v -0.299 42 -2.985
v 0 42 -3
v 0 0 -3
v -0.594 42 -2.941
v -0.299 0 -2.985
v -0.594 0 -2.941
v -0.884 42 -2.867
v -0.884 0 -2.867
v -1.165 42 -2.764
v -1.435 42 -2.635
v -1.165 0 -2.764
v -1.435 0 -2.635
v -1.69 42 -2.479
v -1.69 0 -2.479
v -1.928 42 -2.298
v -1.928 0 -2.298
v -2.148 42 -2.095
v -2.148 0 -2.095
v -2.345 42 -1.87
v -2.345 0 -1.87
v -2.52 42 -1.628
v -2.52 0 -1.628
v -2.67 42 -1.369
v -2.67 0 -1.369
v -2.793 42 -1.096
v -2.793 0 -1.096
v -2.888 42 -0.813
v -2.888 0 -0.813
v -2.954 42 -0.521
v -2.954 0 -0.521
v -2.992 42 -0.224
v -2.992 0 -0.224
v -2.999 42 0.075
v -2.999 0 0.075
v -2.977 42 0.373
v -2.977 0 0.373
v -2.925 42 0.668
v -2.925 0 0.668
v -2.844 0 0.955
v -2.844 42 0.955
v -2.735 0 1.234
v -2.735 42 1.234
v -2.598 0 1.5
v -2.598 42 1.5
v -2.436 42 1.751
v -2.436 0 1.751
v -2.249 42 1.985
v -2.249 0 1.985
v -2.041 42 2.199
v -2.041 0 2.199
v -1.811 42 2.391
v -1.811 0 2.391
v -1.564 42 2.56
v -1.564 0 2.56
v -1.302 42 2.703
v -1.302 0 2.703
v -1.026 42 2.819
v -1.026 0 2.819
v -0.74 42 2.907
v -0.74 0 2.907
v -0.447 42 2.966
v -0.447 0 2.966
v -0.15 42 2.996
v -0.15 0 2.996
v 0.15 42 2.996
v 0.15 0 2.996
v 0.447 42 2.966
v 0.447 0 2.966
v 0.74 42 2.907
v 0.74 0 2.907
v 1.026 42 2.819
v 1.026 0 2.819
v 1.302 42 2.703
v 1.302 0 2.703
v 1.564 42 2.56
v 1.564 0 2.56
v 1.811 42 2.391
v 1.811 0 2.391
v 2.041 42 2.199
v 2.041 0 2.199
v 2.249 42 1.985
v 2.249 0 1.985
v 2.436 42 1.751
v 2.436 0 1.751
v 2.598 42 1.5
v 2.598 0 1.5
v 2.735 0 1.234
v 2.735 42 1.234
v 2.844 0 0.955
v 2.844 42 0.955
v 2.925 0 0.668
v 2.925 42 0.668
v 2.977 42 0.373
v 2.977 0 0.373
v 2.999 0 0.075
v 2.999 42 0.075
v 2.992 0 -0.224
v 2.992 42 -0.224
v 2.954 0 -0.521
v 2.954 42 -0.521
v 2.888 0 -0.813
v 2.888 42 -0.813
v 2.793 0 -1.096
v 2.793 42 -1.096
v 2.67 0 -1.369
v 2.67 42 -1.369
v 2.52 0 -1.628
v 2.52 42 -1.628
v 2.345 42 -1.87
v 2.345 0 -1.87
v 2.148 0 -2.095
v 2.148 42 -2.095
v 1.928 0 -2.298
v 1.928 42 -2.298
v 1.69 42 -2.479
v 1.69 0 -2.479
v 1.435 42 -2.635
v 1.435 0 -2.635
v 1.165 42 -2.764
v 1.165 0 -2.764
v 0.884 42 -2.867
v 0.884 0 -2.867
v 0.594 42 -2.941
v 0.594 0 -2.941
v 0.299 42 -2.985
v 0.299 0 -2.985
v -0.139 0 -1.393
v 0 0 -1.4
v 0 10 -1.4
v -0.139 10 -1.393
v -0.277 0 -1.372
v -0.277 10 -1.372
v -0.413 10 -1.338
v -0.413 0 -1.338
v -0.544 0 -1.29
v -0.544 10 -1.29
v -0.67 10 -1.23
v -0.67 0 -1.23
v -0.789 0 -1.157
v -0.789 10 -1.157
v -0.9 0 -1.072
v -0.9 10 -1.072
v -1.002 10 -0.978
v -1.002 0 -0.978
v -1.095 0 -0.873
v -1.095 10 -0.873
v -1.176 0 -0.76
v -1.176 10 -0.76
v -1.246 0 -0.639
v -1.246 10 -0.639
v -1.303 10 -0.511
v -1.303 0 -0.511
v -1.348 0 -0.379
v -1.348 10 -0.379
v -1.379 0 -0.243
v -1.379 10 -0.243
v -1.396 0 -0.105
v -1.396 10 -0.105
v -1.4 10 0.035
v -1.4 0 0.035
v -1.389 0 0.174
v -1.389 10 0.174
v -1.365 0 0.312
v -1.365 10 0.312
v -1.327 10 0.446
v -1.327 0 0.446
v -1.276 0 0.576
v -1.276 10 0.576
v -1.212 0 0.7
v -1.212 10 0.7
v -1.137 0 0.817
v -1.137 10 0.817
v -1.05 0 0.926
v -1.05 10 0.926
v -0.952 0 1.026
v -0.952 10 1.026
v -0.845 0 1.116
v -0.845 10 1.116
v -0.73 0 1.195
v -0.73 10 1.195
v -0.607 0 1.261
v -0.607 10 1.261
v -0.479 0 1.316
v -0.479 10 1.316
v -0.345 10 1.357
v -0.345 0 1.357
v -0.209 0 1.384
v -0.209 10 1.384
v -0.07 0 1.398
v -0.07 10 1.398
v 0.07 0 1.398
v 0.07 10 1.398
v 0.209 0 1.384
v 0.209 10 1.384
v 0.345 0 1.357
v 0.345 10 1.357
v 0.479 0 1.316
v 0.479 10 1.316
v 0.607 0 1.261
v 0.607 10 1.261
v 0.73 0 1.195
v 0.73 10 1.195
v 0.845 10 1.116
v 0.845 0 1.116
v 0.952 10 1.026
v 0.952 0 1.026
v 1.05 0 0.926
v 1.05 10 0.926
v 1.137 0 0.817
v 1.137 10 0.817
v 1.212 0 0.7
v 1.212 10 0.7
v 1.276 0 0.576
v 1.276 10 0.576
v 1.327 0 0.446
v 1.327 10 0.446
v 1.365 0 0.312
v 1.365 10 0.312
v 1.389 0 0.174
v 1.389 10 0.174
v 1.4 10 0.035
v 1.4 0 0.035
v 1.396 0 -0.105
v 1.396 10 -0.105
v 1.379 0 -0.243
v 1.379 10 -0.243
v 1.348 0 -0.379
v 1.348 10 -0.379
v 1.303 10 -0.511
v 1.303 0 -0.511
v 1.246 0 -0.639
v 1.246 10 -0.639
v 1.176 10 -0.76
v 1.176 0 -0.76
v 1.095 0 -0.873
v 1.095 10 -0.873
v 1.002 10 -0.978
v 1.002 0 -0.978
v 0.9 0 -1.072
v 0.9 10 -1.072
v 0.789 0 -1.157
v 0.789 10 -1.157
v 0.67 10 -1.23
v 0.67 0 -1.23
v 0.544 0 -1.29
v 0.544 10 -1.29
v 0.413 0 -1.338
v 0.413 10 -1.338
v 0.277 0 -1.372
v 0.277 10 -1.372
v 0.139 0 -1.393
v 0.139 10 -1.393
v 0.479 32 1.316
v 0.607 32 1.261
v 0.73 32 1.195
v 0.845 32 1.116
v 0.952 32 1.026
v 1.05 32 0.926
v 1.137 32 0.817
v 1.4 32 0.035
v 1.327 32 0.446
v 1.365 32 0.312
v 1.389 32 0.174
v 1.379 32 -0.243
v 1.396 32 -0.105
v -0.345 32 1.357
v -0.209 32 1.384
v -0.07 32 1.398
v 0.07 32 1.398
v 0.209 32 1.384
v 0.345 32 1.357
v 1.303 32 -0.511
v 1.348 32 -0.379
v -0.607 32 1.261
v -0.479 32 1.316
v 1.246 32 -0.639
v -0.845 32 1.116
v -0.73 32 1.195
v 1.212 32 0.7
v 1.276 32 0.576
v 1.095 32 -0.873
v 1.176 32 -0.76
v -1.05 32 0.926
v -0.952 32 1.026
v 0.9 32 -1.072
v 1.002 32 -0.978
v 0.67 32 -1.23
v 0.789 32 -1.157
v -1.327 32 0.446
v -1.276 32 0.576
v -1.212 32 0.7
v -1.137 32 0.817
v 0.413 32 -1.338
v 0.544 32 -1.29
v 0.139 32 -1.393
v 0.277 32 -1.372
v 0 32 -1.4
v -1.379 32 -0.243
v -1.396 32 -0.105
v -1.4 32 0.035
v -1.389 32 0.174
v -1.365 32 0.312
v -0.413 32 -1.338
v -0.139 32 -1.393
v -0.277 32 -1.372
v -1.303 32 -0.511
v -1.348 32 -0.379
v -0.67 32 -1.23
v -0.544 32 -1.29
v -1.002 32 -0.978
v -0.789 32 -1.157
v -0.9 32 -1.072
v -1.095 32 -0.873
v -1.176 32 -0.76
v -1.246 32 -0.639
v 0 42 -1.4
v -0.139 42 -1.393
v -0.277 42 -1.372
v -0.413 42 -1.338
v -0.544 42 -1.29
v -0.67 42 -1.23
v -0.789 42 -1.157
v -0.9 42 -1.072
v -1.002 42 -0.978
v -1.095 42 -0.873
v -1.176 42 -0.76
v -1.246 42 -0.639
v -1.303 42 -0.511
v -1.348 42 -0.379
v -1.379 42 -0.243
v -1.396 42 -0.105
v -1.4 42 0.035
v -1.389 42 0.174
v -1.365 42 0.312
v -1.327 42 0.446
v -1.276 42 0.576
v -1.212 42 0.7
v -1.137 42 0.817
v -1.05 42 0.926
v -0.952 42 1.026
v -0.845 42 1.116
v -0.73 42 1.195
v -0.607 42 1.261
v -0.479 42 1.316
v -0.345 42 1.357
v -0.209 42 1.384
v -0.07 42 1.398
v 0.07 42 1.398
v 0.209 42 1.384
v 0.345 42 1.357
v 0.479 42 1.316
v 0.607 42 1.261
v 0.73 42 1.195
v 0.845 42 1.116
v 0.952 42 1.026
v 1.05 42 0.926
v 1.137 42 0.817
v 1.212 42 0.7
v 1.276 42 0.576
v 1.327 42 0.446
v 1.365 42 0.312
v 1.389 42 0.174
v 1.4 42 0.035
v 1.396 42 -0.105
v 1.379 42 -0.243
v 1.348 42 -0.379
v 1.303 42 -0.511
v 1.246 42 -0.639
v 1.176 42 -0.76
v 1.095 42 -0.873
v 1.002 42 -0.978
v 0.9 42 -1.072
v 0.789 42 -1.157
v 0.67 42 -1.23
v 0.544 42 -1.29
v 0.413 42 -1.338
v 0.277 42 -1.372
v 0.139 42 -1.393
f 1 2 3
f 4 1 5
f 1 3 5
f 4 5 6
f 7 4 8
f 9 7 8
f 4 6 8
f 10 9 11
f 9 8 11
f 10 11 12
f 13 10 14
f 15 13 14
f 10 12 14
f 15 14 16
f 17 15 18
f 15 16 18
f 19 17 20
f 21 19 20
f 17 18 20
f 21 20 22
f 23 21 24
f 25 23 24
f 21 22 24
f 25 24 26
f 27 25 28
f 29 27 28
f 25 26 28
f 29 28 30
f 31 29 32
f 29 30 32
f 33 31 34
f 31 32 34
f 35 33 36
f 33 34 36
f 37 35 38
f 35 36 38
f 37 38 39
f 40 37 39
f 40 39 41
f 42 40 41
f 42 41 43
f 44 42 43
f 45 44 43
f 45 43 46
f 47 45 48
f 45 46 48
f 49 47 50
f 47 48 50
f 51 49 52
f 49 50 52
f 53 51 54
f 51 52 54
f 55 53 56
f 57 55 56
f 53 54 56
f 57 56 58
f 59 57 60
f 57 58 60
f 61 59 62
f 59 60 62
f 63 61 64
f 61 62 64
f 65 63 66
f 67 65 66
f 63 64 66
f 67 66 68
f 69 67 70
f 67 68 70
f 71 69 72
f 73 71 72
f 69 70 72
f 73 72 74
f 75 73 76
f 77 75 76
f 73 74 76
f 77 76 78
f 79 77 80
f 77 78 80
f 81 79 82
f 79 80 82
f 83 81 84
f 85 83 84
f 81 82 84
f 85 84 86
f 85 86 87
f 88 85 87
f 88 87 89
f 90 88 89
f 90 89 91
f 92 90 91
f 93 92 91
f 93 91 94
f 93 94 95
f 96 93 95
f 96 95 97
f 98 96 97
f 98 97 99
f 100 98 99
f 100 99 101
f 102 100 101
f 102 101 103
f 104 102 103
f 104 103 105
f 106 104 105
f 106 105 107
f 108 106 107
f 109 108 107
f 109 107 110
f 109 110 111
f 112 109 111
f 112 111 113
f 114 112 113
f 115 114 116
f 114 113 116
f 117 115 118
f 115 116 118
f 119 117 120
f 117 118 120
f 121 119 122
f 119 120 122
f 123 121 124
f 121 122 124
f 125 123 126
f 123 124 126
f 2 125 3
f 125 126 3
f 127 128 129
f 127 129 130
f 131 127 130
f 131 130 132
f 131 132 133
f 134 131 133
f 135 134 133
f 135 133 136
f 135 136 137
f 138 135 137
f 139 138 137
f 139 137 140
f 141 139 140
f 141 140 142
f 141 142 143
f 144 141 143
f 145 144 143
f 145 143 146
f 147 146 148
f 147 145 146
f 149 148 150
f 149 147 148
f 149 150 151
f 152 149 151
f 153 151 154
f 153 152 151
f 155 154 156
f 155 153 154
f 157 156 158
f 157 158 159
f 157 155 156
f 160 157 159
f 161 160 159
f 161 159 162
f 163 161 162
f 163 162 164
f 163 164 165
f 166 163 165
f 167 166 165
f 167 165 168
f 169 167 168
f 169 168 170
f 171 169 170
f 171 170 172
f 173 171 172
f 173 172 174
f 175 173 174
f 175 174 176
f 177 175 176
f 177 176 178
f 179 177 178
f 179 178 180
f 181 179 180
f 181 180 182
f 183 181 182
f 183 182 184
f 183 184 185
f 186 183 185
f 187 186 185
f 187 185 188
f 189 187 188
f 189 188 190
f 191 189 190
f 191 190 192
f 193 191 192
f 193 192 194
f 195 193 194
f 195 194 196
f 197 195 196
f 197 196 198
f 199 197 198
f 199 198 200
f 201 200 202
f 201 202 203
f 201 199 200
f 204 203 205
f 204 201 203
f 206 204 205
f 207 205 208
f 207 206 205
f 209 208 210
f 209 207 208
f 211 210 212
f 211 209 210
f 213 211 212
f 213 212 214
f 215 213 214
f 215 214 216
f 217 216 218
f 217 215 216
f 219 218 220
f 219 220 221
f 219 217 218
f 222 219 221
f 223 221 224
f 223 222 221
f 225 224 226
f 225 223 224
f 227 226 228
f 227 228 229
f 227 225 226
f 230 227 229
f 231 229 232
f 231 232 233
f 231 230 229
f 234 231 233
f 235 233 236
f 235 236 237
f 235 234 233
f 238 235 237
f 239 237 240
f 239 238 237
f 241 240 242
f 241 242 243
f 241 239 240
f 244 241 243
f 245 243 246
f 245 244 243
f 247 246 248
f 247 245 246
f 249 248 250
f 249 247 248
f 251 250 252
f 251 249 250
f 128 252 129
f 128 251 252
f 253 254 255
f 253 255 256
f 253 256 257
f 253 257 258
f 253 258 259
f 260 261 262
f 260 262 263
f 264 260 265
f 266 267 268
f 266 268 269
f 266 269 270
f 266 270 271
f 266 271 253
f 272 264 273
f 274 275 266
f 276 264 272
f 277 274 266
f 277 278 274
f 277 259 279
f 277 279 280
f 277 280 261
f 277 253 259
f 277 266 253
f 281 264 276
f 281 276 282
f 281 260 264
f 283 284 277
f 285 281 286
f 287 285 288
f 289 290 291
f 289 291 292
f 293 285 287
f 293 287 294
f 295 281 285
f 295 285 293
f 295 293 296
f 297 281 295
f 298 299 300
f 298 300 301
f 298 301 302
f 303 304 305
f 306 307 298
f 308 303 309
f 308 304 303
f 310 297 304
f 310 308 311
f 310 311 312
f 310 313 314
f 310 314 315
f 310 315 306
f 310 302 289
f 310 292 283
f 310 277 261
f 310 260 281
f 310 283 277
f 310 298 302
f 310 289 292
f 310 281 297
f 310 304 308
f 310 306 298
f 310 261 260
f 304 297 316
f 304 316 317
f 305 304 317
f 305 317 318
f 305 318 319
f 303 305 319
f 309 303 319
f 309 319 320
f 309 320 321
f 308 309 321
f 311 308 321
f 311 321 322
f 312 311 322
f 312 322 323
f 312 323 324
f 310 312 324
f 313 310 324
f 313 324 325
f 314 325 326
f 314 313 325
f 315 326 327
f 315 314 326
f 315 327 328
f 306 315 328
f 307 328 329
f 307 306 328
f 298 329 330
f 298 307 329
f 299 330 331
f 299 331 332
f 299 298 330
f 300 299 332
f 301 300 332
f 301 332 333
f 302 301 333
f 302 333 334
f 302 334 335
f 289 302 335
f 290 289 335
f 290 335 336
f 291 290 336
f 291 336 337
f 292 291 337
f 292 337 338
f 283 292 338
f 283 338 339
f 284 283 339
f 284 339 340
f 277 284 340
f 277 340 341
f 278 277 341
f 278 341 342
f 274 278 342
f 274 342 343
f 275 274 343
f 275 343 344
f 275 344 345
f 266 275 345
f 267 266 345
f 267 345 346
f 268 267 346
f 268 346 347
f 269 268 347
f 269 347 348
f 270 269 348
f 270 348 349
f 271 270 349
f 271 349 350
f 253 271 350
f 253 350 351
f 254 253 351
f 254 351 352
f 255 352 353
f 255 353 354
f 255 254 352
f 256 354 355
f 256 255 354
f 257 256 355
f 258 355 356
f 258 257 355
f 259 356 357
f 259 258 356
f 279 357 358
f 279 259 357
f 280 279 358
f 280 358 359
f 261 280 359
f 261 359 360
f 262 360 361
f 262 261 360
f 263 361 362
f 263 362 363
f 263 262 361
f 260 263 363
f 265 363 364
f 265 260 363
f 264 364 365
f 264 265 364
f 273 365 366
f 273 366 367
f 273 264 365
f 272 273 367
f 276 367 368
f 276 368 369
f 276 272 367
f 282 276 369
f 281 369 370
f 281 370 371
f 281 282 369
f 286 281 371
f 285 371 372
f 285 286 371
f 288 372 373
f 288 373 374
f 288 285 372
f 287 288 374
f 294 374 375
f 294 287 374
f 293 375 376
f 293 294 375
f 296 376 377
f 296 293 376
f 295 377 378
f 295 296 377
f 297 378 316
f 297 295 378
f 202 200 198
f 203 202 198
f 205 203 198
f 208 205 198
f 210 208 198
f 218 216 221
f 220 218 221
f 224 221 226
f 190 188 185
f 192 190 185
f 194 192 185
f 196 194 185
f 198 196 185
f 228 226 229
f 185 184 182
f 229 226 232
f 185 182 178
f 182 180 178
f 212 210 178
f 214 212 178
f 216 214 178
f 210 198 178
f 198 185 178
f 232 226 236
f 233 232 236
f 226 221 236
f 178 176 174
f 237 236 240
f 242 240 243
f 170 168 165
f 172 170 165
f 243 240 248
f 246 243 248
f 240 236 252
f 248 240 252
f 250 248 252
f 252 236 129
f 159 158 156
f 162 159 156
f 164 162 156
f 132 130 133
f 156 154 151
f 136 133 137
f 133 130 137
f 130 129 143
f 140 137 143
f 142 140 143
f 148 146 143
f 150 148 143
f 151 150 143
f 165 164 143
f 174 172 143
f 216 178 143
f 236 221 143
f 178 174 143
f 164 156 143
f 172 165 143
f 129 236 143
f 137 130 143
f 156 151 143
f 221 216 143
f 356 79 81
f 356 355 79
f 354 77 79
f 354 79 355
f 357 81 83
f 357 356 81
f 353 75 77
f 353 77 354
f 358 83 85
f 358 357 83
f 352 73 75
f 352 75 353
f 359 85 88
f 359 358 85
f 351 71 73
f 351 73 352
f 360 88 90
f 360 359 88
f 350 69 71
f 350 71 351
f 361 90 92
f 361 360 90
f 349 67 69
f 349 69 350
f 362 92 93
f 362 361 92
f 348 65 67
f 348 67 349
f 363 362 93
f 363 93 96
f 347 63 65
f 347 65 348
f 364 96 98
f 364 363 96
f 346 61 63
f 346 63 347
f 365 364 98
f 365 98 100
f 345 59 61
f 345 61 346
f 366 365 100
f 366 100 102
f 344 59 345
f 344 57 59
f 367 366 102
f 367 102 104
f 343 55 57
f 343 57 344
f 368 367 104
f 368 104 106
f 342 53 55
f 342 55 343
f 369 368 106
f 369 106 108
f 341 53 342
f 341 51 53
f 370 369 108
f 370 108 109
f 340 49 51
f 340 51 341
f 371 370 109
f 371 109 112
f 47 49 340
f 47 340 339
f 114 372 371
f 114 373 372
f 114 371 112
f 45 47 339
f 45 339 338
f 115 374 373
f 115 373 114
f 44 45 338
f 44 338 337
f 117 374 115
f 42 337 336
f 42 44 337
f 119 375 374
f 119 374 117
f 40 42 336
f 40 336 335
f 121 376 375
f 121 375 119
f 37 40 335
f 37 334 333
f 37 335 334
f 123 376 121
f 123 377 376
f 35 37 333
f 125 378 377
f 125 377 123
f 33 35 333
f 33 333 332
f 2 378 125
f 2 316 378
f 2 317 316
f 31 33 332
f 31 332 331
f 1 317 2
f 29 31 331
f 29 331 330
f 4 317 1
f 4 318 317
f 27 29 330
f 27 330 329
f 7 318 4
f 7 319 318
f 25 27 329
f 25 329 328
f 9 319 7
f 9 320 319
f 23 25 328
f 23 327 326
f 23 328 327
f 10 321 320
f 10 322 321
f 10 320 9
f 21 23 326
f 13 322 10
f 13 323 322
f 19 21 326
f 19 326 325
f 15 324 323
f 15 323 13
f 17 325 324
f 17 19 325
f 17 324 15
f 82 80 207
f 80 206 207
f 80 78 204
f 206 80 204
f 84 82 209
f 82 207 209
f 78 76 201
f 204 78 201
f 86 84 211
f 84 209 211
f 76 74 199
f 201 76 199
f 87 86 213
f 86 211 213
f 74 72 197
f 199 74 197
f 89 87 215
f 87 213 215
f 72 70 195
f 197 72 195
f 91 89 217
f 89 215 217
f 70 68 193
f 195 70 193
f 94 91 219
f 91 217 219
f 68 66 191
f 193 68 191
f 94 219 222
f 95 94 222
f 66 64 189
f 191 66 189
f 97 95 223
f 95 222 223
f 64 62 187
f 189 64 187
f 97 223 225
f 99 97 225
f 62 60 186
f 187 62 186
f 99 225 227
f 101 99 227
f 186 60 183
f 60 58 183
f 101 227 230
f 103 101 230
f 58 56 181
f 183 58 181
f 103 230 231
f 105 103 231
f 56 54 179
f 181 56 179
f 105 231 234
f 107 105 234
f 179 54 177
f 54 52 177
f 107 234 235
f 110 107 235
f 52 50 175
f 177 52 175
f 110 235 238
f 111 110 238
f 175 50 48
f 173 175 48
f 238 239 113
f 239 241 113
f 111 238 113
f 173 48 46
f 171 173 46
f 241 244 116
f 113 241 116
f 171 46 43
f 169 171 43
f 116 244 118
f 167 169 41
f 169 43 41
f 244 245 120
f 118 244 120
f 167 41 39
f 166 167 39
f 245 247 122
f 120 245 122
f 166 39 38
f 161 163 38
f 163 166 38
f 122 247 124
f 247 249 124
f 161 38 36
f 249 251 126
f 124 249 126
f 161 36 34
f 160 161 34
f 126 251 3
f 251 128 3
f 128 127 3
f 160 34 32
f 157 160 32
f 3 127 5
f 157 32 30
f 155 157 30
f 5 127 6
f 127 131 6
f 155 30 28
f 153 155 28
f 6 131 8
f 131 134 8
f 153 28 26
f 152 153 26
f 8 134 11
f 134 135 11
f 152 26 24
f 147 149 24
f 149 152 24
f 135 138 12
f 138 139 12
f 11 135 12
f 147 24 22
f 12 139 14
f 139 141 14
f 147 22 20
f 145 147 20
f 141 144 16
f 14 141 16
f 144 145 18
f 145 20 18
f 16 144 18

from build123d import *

# Parameters (mm, degrees)
SKETCH1_R           = 3
SKETCH1_R_2         = 1.4
BOSS_EXTRUDE1_DEPTH = 42
BOSS_EXTRUDE2_START = 10
SKETCH1_3_R         = 1.4
BOSS_EXTRUDE2_DEPTH = 22


with BuildPart() as part:
    # Sketch1 → Boss-Extrude1 (new body)
    with BuildSketch(Plane(origin=(0, 0, 0), x_dir=(1, 0, 0), z_dir=(0, 1, 0))):
        Circle(SKETCH1_R)
        Circle(SKETCH1_R_2, mode=Mode.SUBTRACT)
    extrude(amount=BOSS_EXTRUDE1_DEPTH)

    # Sketch1<3> → Boss-Extrude2 (add)
    with BuildSketch(Plane(origin=(0, 0, 0), x_dir=(1, 0, 0), z_dir=(0, 1, 0)).offset(BOSS_EXTRUDE2_START)):
        Circle(SKETCH1_3_R)
    extrude(amount=BOSS_EXTRUDE2_DEPTH)


solid = part.part
